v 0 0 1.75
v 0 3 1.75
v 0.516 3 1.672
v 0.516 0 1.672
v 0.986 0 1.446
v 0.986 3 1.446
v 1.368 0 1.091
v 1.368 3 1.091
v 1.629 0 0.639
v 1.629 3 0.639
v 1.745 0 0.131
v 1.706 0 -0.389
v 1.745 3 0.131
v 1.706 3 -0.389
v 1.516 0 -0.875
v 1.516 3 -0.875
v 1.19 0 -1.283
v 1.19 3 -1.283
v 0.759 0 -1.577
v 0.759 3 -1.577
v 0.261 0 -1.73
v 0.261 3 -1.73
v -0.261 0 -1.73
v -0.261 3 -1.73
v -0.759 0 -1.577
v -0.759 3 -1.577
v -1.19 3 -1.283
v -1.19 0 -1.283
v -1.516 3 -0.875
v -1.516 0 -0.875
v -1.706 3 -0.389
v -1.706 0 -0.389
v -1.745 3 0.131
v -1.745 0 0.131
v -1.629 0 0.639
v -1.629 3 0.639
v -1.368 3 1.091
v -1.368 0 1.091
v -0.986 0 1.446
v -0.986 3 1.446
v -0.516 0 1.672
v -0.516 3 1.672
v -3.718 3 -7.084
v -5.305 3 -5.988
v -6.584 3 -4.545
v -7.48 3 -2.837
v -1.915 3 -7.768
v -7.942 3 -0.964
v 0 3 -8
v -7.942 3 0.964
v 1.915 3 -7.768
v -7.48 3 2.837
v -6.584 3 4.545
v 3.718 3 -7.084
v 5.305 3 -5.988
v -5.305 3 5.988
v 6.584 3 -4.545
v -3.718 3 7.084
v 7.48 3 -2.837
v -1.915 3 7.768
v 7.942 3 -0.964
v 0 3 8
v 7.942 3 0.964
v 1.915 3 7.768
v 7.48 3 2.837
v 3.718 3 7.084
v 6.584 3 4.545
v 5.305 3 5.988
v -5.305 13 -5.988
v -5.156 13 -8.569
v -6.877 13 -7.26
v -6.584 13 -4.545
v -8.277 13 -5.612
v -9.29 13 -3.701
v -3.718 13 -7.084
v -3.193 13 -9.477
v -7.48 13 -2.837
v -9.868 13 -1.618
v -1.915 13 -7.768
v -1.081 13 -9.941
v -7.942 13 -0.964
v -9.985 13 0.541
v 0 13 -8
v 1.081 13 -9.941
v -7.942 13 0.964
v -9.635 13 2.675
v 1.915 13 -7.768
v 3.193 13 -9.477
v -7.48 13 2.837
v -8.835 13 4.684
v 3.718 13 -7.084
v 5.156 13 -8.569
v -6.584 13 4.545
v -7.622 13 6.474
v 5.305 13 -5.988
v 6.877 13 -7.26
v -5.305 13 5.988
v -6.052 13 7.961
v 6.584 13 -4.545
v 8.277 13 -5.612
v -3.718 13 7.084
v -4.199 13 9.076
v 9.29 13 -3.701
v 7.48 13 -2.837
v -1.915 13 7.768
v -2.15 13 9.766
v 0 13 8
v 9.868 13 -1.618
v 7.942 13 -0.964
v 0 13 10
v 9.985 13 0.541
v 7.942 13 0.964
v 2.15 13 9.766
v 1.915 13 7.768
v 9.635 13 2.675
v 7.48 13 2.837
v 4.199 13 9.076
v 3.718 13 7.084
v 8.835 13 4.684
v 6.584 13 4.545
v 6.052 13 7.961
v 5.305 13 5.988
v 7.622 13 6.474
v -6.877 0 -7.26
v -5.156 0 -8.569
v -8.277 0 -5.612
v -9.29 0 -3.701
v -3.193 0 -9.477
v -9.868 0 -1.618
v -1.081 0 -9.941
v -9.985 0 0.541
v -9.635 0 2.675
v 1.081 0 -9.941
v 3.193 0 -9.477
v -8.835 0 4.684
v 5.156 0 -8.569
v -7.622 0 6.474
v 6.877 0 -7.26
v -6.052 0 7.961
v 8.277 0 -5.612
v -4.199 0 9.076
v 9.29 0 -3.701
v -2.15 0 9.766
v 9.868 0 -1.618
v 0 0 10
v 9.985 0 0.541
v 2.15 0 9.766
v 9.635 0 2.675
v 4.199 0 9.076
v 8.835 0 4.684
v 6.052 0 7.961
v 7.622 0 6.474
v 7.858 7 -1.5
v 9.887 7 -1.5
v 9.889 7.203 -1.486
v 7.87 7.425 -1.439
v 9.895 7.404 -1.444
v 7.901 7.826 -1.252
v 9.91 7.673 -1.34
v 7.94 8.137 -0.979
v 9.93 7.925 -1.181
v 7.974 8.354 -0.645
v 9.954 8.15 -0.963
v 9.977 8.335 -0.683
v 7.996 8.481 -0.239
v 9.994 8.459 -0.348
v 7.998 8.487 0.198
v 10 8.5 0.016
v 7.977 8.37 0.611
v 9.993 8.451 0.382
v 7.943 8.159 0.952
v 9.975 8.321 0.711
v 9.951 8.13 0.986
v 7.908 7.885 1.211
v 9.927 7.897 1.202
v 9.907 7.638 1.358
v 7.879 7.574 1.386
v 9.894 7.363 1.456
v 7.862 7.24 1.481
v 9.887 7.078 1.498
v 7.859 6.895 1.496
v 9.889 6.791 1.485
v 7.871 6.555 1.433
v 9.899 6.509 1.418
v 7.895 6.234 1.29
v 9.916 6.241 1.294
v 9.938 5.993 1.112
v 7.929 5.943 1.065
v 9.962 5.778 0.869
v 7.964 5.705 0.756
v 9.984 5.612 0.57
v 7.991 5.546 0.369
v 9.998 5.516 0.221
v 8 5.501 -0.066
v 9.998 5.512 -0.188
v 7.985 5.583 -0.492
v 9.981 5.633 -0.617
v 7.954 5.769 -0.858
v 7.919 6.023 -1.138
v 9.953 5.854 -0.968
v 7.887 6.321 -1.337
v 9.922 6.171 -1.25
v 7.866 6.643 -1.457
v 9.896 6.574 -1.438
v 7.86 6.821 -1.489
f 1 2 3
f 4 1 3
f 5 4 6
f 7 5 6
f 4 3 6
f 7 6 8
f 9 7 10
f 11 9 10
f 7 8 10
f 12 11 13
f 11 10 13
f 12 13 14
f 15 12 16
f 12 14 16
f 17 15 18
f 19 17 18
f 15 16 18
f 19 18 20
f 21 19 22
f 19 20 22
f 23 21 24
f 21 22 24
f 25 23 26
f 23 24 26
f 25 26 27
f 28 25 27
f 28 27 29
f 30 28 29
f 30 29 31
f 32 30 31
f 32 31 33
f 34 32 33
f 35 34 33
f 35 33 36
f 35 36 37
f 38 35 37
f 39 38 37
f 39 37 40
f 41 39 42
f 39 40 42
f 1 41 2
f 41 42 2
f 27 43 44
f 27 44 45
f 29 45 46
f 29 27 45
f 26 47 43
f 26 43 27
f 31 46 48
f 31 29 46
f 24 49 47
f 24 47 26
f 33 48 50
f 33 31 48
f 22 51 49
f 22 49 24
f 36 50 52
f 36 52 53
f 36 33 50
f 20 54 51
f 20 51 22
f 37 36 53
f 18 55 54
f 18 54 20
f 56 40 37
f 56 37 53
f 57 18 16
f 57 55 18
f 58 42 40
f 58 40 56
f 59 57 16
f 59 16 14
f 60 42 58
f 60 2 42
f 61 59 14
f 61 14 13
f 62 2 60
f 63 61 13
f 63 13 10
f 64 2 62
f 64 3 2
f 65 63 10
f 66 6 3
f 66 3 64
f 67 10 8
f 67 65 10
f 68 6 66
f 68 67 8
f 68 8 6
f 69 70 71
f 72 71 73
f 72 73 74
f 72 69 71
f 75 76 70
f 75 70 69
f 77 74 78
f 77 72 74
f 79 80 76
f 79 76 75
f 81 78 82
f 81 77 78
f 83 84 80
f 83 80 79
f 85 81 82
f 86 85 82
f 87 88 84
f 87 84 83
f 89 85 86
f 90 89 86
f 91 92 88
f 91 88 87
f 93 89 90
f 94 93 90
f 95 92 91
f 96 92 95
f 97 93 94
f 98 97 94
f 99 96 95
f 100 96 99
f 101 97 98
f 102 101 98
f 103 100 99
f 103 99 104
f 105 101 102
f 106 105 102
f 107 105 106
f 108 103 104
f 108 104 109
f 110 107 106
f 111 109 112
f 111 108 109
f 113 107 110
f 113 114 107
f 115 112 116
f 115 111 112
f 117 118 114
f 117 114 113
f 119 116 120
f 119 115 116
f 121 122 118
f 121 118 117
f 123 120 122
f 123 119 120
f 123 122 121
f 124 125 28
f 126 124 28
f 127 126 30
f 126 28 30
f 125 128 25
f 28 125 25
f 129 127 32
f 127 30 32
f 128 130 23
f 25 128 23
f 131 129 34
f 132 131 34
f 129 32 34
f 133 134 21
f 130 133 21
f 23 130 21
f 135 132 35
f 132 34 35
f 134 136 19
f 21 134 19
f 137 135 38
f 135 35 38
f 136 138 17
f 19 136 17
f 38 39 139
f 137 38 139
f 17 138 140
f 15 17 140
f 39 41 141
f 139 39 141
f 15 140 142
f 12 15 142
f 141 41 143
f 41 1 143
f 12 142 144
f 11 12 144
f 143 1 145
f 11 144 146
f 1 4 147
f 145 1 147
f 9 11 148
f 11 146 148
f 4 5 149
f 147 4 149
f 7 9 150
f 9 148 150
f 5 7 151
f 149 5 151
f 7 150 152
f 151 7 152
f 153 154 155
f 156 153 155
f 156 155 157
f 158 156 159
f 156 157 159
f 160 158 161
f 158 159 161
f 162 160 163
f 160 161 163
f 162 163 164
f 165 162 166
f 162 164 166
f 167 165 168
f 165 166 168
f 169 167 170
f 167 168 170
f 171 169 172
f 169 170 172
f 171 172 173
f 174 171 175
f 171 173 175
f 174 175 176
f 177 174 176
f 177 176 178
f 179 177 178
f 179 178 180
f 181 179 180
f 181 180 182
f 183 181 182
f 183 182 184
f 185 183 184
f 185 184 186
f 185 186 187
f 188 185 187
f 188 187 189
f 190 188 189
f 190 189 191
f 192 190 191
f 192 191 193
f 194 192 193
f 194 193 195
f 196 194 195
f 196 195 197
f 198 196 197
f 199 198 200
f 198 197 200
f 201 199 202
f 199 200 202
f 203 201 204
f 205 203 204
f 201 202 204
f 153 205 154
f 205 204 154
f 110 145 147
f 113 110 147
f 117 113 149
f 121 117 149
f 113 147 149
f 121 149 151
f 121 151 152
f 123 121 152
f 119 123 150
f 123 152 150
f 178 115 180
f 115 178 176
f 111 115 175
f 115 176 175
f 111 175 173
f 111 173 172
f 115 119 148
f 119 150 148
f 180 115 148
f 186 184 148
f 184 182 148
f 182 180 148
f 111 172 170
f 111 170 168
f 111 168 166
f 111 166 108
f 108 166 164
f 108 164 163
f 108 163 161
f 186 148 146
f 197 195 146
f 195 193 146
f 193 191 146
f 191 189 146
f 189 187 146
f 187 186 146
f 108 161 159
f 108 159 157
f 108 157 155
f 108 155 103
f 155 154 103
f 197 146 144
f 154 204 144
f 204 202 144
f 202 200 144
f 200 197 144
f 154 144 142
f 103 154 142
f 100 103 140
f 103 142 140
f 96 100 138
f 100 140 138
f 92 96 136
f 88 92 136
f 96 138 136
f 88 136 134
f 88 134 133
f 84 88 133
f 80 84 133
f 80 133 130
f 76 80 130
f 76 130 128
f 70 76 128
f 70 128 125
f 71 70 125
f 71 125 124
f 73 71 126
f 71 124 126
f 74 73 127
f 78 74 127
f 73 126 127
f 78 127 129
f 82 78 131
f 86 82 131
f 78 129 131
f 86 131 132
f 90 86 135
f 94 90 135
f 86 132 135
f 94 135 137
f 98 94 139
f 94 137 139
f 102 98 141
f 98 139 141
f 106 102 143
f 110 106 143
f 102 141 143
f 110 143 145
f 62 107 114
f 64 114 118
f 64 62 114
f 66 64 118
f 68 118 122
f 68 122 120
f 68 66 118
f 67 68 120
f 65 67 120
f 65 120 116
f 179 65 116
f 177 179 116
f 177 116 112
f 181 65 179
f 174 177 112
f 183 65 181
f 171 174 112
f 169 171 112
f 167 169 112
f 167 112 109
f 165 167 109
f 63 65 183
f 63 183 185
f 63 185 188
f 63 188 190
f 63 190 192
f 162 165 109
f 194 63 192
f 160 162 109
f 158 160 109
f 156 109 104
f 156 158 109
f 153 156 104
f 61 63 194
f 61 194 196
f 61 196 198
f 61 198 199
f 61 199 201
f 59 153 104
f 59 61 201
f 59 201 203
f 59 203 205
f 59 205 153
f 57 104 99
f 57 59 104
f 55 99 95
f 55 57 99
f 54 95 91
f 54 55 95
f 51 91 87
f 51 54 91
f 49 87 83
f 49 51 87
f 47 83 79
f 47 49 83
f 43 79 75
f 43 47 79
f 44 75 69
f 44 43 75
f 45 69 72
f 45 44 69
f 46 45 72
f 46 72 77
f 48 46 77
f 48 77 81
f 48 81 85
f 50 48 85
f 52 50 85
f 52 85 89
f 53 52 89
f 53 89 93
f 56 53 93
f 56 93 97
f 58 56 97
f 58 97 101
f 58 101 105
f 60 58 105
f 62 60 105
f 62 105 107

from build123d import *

# Parameters (mm, degrees)
SKETCH1_R           = 10
BOSS_EXTRUDE1_DEPTH = 3
SKETCH2_R           = 1.75
CUT_EXTRUDE1_DEPTH  = 3
SKETCH3_R           = 10
SKETCH3_R_2         = 8
BOSS_EXTRUDE2_DEPTH = 10
SKETCH4_R           = 1.5
CUT_EXTRUDE2_DEPTH  = 5


with BuildPart() as part:
    # Sketch1 → Boss-Extrude1 (new body)
    with BuildSketch(Plane(origin=(0, 0, 0), x_dir=(1, 0, 0), z_dir=(0, 1, 0))):
        with Locations(Location((0, 0, 0), (0, 0, 270))):
            Circle(SKETCH1_R)
    extrude(amount=BOSS_EXTRUDE1_DEPTH)

    # Sketch2 → Cut-Extrude1 (cut)
    with BuildSketch(Plane(origin=(0, 3, 0), x_dir=(1, 0, 0), z_dir=(0, 1, 0))):
        with Locations(Location((0, 0, 0), (0, 0, 270))):
            Circle(SKETCH2_R)
    extrude(amount=-CUT_EXTRUDE1_DEPTH, mode=Mode.SUBTRACT)

    # Sketch3 → Boss-Extrude2 (add)
    with BuildSketch(Plane(origin=(0, 3, 0), x_dir=(1, 0, 0), z_dir=(0, 1, 0))):
        with Locations(Location((0, 0, 0), (0, 0, 270))):
            Circle(SKETCH3_R)
        with Locations(Location((0, 0, 0), (0, 0, 270))):
            Circle(SKETCH3_R_2, mode=Mode.SUBTRACT)
    extrude(amount=BOSS_EXTRUDE2_DEPTH)

    # Sketch4 → Cut-Extrude2 (cut)
    with BuildSketch(Plane(origin=(10, 0, 0), x_dir=(0, 0, -1), z_dir=(1, 0, 0))):
        with Locations((0, 7)):
            Circle(SKETCH4_R)
    extrude(amount=-CUT_EXTRUDE2_DEPTH, mode=Mode.SUBTRACT)


solid = part.part
